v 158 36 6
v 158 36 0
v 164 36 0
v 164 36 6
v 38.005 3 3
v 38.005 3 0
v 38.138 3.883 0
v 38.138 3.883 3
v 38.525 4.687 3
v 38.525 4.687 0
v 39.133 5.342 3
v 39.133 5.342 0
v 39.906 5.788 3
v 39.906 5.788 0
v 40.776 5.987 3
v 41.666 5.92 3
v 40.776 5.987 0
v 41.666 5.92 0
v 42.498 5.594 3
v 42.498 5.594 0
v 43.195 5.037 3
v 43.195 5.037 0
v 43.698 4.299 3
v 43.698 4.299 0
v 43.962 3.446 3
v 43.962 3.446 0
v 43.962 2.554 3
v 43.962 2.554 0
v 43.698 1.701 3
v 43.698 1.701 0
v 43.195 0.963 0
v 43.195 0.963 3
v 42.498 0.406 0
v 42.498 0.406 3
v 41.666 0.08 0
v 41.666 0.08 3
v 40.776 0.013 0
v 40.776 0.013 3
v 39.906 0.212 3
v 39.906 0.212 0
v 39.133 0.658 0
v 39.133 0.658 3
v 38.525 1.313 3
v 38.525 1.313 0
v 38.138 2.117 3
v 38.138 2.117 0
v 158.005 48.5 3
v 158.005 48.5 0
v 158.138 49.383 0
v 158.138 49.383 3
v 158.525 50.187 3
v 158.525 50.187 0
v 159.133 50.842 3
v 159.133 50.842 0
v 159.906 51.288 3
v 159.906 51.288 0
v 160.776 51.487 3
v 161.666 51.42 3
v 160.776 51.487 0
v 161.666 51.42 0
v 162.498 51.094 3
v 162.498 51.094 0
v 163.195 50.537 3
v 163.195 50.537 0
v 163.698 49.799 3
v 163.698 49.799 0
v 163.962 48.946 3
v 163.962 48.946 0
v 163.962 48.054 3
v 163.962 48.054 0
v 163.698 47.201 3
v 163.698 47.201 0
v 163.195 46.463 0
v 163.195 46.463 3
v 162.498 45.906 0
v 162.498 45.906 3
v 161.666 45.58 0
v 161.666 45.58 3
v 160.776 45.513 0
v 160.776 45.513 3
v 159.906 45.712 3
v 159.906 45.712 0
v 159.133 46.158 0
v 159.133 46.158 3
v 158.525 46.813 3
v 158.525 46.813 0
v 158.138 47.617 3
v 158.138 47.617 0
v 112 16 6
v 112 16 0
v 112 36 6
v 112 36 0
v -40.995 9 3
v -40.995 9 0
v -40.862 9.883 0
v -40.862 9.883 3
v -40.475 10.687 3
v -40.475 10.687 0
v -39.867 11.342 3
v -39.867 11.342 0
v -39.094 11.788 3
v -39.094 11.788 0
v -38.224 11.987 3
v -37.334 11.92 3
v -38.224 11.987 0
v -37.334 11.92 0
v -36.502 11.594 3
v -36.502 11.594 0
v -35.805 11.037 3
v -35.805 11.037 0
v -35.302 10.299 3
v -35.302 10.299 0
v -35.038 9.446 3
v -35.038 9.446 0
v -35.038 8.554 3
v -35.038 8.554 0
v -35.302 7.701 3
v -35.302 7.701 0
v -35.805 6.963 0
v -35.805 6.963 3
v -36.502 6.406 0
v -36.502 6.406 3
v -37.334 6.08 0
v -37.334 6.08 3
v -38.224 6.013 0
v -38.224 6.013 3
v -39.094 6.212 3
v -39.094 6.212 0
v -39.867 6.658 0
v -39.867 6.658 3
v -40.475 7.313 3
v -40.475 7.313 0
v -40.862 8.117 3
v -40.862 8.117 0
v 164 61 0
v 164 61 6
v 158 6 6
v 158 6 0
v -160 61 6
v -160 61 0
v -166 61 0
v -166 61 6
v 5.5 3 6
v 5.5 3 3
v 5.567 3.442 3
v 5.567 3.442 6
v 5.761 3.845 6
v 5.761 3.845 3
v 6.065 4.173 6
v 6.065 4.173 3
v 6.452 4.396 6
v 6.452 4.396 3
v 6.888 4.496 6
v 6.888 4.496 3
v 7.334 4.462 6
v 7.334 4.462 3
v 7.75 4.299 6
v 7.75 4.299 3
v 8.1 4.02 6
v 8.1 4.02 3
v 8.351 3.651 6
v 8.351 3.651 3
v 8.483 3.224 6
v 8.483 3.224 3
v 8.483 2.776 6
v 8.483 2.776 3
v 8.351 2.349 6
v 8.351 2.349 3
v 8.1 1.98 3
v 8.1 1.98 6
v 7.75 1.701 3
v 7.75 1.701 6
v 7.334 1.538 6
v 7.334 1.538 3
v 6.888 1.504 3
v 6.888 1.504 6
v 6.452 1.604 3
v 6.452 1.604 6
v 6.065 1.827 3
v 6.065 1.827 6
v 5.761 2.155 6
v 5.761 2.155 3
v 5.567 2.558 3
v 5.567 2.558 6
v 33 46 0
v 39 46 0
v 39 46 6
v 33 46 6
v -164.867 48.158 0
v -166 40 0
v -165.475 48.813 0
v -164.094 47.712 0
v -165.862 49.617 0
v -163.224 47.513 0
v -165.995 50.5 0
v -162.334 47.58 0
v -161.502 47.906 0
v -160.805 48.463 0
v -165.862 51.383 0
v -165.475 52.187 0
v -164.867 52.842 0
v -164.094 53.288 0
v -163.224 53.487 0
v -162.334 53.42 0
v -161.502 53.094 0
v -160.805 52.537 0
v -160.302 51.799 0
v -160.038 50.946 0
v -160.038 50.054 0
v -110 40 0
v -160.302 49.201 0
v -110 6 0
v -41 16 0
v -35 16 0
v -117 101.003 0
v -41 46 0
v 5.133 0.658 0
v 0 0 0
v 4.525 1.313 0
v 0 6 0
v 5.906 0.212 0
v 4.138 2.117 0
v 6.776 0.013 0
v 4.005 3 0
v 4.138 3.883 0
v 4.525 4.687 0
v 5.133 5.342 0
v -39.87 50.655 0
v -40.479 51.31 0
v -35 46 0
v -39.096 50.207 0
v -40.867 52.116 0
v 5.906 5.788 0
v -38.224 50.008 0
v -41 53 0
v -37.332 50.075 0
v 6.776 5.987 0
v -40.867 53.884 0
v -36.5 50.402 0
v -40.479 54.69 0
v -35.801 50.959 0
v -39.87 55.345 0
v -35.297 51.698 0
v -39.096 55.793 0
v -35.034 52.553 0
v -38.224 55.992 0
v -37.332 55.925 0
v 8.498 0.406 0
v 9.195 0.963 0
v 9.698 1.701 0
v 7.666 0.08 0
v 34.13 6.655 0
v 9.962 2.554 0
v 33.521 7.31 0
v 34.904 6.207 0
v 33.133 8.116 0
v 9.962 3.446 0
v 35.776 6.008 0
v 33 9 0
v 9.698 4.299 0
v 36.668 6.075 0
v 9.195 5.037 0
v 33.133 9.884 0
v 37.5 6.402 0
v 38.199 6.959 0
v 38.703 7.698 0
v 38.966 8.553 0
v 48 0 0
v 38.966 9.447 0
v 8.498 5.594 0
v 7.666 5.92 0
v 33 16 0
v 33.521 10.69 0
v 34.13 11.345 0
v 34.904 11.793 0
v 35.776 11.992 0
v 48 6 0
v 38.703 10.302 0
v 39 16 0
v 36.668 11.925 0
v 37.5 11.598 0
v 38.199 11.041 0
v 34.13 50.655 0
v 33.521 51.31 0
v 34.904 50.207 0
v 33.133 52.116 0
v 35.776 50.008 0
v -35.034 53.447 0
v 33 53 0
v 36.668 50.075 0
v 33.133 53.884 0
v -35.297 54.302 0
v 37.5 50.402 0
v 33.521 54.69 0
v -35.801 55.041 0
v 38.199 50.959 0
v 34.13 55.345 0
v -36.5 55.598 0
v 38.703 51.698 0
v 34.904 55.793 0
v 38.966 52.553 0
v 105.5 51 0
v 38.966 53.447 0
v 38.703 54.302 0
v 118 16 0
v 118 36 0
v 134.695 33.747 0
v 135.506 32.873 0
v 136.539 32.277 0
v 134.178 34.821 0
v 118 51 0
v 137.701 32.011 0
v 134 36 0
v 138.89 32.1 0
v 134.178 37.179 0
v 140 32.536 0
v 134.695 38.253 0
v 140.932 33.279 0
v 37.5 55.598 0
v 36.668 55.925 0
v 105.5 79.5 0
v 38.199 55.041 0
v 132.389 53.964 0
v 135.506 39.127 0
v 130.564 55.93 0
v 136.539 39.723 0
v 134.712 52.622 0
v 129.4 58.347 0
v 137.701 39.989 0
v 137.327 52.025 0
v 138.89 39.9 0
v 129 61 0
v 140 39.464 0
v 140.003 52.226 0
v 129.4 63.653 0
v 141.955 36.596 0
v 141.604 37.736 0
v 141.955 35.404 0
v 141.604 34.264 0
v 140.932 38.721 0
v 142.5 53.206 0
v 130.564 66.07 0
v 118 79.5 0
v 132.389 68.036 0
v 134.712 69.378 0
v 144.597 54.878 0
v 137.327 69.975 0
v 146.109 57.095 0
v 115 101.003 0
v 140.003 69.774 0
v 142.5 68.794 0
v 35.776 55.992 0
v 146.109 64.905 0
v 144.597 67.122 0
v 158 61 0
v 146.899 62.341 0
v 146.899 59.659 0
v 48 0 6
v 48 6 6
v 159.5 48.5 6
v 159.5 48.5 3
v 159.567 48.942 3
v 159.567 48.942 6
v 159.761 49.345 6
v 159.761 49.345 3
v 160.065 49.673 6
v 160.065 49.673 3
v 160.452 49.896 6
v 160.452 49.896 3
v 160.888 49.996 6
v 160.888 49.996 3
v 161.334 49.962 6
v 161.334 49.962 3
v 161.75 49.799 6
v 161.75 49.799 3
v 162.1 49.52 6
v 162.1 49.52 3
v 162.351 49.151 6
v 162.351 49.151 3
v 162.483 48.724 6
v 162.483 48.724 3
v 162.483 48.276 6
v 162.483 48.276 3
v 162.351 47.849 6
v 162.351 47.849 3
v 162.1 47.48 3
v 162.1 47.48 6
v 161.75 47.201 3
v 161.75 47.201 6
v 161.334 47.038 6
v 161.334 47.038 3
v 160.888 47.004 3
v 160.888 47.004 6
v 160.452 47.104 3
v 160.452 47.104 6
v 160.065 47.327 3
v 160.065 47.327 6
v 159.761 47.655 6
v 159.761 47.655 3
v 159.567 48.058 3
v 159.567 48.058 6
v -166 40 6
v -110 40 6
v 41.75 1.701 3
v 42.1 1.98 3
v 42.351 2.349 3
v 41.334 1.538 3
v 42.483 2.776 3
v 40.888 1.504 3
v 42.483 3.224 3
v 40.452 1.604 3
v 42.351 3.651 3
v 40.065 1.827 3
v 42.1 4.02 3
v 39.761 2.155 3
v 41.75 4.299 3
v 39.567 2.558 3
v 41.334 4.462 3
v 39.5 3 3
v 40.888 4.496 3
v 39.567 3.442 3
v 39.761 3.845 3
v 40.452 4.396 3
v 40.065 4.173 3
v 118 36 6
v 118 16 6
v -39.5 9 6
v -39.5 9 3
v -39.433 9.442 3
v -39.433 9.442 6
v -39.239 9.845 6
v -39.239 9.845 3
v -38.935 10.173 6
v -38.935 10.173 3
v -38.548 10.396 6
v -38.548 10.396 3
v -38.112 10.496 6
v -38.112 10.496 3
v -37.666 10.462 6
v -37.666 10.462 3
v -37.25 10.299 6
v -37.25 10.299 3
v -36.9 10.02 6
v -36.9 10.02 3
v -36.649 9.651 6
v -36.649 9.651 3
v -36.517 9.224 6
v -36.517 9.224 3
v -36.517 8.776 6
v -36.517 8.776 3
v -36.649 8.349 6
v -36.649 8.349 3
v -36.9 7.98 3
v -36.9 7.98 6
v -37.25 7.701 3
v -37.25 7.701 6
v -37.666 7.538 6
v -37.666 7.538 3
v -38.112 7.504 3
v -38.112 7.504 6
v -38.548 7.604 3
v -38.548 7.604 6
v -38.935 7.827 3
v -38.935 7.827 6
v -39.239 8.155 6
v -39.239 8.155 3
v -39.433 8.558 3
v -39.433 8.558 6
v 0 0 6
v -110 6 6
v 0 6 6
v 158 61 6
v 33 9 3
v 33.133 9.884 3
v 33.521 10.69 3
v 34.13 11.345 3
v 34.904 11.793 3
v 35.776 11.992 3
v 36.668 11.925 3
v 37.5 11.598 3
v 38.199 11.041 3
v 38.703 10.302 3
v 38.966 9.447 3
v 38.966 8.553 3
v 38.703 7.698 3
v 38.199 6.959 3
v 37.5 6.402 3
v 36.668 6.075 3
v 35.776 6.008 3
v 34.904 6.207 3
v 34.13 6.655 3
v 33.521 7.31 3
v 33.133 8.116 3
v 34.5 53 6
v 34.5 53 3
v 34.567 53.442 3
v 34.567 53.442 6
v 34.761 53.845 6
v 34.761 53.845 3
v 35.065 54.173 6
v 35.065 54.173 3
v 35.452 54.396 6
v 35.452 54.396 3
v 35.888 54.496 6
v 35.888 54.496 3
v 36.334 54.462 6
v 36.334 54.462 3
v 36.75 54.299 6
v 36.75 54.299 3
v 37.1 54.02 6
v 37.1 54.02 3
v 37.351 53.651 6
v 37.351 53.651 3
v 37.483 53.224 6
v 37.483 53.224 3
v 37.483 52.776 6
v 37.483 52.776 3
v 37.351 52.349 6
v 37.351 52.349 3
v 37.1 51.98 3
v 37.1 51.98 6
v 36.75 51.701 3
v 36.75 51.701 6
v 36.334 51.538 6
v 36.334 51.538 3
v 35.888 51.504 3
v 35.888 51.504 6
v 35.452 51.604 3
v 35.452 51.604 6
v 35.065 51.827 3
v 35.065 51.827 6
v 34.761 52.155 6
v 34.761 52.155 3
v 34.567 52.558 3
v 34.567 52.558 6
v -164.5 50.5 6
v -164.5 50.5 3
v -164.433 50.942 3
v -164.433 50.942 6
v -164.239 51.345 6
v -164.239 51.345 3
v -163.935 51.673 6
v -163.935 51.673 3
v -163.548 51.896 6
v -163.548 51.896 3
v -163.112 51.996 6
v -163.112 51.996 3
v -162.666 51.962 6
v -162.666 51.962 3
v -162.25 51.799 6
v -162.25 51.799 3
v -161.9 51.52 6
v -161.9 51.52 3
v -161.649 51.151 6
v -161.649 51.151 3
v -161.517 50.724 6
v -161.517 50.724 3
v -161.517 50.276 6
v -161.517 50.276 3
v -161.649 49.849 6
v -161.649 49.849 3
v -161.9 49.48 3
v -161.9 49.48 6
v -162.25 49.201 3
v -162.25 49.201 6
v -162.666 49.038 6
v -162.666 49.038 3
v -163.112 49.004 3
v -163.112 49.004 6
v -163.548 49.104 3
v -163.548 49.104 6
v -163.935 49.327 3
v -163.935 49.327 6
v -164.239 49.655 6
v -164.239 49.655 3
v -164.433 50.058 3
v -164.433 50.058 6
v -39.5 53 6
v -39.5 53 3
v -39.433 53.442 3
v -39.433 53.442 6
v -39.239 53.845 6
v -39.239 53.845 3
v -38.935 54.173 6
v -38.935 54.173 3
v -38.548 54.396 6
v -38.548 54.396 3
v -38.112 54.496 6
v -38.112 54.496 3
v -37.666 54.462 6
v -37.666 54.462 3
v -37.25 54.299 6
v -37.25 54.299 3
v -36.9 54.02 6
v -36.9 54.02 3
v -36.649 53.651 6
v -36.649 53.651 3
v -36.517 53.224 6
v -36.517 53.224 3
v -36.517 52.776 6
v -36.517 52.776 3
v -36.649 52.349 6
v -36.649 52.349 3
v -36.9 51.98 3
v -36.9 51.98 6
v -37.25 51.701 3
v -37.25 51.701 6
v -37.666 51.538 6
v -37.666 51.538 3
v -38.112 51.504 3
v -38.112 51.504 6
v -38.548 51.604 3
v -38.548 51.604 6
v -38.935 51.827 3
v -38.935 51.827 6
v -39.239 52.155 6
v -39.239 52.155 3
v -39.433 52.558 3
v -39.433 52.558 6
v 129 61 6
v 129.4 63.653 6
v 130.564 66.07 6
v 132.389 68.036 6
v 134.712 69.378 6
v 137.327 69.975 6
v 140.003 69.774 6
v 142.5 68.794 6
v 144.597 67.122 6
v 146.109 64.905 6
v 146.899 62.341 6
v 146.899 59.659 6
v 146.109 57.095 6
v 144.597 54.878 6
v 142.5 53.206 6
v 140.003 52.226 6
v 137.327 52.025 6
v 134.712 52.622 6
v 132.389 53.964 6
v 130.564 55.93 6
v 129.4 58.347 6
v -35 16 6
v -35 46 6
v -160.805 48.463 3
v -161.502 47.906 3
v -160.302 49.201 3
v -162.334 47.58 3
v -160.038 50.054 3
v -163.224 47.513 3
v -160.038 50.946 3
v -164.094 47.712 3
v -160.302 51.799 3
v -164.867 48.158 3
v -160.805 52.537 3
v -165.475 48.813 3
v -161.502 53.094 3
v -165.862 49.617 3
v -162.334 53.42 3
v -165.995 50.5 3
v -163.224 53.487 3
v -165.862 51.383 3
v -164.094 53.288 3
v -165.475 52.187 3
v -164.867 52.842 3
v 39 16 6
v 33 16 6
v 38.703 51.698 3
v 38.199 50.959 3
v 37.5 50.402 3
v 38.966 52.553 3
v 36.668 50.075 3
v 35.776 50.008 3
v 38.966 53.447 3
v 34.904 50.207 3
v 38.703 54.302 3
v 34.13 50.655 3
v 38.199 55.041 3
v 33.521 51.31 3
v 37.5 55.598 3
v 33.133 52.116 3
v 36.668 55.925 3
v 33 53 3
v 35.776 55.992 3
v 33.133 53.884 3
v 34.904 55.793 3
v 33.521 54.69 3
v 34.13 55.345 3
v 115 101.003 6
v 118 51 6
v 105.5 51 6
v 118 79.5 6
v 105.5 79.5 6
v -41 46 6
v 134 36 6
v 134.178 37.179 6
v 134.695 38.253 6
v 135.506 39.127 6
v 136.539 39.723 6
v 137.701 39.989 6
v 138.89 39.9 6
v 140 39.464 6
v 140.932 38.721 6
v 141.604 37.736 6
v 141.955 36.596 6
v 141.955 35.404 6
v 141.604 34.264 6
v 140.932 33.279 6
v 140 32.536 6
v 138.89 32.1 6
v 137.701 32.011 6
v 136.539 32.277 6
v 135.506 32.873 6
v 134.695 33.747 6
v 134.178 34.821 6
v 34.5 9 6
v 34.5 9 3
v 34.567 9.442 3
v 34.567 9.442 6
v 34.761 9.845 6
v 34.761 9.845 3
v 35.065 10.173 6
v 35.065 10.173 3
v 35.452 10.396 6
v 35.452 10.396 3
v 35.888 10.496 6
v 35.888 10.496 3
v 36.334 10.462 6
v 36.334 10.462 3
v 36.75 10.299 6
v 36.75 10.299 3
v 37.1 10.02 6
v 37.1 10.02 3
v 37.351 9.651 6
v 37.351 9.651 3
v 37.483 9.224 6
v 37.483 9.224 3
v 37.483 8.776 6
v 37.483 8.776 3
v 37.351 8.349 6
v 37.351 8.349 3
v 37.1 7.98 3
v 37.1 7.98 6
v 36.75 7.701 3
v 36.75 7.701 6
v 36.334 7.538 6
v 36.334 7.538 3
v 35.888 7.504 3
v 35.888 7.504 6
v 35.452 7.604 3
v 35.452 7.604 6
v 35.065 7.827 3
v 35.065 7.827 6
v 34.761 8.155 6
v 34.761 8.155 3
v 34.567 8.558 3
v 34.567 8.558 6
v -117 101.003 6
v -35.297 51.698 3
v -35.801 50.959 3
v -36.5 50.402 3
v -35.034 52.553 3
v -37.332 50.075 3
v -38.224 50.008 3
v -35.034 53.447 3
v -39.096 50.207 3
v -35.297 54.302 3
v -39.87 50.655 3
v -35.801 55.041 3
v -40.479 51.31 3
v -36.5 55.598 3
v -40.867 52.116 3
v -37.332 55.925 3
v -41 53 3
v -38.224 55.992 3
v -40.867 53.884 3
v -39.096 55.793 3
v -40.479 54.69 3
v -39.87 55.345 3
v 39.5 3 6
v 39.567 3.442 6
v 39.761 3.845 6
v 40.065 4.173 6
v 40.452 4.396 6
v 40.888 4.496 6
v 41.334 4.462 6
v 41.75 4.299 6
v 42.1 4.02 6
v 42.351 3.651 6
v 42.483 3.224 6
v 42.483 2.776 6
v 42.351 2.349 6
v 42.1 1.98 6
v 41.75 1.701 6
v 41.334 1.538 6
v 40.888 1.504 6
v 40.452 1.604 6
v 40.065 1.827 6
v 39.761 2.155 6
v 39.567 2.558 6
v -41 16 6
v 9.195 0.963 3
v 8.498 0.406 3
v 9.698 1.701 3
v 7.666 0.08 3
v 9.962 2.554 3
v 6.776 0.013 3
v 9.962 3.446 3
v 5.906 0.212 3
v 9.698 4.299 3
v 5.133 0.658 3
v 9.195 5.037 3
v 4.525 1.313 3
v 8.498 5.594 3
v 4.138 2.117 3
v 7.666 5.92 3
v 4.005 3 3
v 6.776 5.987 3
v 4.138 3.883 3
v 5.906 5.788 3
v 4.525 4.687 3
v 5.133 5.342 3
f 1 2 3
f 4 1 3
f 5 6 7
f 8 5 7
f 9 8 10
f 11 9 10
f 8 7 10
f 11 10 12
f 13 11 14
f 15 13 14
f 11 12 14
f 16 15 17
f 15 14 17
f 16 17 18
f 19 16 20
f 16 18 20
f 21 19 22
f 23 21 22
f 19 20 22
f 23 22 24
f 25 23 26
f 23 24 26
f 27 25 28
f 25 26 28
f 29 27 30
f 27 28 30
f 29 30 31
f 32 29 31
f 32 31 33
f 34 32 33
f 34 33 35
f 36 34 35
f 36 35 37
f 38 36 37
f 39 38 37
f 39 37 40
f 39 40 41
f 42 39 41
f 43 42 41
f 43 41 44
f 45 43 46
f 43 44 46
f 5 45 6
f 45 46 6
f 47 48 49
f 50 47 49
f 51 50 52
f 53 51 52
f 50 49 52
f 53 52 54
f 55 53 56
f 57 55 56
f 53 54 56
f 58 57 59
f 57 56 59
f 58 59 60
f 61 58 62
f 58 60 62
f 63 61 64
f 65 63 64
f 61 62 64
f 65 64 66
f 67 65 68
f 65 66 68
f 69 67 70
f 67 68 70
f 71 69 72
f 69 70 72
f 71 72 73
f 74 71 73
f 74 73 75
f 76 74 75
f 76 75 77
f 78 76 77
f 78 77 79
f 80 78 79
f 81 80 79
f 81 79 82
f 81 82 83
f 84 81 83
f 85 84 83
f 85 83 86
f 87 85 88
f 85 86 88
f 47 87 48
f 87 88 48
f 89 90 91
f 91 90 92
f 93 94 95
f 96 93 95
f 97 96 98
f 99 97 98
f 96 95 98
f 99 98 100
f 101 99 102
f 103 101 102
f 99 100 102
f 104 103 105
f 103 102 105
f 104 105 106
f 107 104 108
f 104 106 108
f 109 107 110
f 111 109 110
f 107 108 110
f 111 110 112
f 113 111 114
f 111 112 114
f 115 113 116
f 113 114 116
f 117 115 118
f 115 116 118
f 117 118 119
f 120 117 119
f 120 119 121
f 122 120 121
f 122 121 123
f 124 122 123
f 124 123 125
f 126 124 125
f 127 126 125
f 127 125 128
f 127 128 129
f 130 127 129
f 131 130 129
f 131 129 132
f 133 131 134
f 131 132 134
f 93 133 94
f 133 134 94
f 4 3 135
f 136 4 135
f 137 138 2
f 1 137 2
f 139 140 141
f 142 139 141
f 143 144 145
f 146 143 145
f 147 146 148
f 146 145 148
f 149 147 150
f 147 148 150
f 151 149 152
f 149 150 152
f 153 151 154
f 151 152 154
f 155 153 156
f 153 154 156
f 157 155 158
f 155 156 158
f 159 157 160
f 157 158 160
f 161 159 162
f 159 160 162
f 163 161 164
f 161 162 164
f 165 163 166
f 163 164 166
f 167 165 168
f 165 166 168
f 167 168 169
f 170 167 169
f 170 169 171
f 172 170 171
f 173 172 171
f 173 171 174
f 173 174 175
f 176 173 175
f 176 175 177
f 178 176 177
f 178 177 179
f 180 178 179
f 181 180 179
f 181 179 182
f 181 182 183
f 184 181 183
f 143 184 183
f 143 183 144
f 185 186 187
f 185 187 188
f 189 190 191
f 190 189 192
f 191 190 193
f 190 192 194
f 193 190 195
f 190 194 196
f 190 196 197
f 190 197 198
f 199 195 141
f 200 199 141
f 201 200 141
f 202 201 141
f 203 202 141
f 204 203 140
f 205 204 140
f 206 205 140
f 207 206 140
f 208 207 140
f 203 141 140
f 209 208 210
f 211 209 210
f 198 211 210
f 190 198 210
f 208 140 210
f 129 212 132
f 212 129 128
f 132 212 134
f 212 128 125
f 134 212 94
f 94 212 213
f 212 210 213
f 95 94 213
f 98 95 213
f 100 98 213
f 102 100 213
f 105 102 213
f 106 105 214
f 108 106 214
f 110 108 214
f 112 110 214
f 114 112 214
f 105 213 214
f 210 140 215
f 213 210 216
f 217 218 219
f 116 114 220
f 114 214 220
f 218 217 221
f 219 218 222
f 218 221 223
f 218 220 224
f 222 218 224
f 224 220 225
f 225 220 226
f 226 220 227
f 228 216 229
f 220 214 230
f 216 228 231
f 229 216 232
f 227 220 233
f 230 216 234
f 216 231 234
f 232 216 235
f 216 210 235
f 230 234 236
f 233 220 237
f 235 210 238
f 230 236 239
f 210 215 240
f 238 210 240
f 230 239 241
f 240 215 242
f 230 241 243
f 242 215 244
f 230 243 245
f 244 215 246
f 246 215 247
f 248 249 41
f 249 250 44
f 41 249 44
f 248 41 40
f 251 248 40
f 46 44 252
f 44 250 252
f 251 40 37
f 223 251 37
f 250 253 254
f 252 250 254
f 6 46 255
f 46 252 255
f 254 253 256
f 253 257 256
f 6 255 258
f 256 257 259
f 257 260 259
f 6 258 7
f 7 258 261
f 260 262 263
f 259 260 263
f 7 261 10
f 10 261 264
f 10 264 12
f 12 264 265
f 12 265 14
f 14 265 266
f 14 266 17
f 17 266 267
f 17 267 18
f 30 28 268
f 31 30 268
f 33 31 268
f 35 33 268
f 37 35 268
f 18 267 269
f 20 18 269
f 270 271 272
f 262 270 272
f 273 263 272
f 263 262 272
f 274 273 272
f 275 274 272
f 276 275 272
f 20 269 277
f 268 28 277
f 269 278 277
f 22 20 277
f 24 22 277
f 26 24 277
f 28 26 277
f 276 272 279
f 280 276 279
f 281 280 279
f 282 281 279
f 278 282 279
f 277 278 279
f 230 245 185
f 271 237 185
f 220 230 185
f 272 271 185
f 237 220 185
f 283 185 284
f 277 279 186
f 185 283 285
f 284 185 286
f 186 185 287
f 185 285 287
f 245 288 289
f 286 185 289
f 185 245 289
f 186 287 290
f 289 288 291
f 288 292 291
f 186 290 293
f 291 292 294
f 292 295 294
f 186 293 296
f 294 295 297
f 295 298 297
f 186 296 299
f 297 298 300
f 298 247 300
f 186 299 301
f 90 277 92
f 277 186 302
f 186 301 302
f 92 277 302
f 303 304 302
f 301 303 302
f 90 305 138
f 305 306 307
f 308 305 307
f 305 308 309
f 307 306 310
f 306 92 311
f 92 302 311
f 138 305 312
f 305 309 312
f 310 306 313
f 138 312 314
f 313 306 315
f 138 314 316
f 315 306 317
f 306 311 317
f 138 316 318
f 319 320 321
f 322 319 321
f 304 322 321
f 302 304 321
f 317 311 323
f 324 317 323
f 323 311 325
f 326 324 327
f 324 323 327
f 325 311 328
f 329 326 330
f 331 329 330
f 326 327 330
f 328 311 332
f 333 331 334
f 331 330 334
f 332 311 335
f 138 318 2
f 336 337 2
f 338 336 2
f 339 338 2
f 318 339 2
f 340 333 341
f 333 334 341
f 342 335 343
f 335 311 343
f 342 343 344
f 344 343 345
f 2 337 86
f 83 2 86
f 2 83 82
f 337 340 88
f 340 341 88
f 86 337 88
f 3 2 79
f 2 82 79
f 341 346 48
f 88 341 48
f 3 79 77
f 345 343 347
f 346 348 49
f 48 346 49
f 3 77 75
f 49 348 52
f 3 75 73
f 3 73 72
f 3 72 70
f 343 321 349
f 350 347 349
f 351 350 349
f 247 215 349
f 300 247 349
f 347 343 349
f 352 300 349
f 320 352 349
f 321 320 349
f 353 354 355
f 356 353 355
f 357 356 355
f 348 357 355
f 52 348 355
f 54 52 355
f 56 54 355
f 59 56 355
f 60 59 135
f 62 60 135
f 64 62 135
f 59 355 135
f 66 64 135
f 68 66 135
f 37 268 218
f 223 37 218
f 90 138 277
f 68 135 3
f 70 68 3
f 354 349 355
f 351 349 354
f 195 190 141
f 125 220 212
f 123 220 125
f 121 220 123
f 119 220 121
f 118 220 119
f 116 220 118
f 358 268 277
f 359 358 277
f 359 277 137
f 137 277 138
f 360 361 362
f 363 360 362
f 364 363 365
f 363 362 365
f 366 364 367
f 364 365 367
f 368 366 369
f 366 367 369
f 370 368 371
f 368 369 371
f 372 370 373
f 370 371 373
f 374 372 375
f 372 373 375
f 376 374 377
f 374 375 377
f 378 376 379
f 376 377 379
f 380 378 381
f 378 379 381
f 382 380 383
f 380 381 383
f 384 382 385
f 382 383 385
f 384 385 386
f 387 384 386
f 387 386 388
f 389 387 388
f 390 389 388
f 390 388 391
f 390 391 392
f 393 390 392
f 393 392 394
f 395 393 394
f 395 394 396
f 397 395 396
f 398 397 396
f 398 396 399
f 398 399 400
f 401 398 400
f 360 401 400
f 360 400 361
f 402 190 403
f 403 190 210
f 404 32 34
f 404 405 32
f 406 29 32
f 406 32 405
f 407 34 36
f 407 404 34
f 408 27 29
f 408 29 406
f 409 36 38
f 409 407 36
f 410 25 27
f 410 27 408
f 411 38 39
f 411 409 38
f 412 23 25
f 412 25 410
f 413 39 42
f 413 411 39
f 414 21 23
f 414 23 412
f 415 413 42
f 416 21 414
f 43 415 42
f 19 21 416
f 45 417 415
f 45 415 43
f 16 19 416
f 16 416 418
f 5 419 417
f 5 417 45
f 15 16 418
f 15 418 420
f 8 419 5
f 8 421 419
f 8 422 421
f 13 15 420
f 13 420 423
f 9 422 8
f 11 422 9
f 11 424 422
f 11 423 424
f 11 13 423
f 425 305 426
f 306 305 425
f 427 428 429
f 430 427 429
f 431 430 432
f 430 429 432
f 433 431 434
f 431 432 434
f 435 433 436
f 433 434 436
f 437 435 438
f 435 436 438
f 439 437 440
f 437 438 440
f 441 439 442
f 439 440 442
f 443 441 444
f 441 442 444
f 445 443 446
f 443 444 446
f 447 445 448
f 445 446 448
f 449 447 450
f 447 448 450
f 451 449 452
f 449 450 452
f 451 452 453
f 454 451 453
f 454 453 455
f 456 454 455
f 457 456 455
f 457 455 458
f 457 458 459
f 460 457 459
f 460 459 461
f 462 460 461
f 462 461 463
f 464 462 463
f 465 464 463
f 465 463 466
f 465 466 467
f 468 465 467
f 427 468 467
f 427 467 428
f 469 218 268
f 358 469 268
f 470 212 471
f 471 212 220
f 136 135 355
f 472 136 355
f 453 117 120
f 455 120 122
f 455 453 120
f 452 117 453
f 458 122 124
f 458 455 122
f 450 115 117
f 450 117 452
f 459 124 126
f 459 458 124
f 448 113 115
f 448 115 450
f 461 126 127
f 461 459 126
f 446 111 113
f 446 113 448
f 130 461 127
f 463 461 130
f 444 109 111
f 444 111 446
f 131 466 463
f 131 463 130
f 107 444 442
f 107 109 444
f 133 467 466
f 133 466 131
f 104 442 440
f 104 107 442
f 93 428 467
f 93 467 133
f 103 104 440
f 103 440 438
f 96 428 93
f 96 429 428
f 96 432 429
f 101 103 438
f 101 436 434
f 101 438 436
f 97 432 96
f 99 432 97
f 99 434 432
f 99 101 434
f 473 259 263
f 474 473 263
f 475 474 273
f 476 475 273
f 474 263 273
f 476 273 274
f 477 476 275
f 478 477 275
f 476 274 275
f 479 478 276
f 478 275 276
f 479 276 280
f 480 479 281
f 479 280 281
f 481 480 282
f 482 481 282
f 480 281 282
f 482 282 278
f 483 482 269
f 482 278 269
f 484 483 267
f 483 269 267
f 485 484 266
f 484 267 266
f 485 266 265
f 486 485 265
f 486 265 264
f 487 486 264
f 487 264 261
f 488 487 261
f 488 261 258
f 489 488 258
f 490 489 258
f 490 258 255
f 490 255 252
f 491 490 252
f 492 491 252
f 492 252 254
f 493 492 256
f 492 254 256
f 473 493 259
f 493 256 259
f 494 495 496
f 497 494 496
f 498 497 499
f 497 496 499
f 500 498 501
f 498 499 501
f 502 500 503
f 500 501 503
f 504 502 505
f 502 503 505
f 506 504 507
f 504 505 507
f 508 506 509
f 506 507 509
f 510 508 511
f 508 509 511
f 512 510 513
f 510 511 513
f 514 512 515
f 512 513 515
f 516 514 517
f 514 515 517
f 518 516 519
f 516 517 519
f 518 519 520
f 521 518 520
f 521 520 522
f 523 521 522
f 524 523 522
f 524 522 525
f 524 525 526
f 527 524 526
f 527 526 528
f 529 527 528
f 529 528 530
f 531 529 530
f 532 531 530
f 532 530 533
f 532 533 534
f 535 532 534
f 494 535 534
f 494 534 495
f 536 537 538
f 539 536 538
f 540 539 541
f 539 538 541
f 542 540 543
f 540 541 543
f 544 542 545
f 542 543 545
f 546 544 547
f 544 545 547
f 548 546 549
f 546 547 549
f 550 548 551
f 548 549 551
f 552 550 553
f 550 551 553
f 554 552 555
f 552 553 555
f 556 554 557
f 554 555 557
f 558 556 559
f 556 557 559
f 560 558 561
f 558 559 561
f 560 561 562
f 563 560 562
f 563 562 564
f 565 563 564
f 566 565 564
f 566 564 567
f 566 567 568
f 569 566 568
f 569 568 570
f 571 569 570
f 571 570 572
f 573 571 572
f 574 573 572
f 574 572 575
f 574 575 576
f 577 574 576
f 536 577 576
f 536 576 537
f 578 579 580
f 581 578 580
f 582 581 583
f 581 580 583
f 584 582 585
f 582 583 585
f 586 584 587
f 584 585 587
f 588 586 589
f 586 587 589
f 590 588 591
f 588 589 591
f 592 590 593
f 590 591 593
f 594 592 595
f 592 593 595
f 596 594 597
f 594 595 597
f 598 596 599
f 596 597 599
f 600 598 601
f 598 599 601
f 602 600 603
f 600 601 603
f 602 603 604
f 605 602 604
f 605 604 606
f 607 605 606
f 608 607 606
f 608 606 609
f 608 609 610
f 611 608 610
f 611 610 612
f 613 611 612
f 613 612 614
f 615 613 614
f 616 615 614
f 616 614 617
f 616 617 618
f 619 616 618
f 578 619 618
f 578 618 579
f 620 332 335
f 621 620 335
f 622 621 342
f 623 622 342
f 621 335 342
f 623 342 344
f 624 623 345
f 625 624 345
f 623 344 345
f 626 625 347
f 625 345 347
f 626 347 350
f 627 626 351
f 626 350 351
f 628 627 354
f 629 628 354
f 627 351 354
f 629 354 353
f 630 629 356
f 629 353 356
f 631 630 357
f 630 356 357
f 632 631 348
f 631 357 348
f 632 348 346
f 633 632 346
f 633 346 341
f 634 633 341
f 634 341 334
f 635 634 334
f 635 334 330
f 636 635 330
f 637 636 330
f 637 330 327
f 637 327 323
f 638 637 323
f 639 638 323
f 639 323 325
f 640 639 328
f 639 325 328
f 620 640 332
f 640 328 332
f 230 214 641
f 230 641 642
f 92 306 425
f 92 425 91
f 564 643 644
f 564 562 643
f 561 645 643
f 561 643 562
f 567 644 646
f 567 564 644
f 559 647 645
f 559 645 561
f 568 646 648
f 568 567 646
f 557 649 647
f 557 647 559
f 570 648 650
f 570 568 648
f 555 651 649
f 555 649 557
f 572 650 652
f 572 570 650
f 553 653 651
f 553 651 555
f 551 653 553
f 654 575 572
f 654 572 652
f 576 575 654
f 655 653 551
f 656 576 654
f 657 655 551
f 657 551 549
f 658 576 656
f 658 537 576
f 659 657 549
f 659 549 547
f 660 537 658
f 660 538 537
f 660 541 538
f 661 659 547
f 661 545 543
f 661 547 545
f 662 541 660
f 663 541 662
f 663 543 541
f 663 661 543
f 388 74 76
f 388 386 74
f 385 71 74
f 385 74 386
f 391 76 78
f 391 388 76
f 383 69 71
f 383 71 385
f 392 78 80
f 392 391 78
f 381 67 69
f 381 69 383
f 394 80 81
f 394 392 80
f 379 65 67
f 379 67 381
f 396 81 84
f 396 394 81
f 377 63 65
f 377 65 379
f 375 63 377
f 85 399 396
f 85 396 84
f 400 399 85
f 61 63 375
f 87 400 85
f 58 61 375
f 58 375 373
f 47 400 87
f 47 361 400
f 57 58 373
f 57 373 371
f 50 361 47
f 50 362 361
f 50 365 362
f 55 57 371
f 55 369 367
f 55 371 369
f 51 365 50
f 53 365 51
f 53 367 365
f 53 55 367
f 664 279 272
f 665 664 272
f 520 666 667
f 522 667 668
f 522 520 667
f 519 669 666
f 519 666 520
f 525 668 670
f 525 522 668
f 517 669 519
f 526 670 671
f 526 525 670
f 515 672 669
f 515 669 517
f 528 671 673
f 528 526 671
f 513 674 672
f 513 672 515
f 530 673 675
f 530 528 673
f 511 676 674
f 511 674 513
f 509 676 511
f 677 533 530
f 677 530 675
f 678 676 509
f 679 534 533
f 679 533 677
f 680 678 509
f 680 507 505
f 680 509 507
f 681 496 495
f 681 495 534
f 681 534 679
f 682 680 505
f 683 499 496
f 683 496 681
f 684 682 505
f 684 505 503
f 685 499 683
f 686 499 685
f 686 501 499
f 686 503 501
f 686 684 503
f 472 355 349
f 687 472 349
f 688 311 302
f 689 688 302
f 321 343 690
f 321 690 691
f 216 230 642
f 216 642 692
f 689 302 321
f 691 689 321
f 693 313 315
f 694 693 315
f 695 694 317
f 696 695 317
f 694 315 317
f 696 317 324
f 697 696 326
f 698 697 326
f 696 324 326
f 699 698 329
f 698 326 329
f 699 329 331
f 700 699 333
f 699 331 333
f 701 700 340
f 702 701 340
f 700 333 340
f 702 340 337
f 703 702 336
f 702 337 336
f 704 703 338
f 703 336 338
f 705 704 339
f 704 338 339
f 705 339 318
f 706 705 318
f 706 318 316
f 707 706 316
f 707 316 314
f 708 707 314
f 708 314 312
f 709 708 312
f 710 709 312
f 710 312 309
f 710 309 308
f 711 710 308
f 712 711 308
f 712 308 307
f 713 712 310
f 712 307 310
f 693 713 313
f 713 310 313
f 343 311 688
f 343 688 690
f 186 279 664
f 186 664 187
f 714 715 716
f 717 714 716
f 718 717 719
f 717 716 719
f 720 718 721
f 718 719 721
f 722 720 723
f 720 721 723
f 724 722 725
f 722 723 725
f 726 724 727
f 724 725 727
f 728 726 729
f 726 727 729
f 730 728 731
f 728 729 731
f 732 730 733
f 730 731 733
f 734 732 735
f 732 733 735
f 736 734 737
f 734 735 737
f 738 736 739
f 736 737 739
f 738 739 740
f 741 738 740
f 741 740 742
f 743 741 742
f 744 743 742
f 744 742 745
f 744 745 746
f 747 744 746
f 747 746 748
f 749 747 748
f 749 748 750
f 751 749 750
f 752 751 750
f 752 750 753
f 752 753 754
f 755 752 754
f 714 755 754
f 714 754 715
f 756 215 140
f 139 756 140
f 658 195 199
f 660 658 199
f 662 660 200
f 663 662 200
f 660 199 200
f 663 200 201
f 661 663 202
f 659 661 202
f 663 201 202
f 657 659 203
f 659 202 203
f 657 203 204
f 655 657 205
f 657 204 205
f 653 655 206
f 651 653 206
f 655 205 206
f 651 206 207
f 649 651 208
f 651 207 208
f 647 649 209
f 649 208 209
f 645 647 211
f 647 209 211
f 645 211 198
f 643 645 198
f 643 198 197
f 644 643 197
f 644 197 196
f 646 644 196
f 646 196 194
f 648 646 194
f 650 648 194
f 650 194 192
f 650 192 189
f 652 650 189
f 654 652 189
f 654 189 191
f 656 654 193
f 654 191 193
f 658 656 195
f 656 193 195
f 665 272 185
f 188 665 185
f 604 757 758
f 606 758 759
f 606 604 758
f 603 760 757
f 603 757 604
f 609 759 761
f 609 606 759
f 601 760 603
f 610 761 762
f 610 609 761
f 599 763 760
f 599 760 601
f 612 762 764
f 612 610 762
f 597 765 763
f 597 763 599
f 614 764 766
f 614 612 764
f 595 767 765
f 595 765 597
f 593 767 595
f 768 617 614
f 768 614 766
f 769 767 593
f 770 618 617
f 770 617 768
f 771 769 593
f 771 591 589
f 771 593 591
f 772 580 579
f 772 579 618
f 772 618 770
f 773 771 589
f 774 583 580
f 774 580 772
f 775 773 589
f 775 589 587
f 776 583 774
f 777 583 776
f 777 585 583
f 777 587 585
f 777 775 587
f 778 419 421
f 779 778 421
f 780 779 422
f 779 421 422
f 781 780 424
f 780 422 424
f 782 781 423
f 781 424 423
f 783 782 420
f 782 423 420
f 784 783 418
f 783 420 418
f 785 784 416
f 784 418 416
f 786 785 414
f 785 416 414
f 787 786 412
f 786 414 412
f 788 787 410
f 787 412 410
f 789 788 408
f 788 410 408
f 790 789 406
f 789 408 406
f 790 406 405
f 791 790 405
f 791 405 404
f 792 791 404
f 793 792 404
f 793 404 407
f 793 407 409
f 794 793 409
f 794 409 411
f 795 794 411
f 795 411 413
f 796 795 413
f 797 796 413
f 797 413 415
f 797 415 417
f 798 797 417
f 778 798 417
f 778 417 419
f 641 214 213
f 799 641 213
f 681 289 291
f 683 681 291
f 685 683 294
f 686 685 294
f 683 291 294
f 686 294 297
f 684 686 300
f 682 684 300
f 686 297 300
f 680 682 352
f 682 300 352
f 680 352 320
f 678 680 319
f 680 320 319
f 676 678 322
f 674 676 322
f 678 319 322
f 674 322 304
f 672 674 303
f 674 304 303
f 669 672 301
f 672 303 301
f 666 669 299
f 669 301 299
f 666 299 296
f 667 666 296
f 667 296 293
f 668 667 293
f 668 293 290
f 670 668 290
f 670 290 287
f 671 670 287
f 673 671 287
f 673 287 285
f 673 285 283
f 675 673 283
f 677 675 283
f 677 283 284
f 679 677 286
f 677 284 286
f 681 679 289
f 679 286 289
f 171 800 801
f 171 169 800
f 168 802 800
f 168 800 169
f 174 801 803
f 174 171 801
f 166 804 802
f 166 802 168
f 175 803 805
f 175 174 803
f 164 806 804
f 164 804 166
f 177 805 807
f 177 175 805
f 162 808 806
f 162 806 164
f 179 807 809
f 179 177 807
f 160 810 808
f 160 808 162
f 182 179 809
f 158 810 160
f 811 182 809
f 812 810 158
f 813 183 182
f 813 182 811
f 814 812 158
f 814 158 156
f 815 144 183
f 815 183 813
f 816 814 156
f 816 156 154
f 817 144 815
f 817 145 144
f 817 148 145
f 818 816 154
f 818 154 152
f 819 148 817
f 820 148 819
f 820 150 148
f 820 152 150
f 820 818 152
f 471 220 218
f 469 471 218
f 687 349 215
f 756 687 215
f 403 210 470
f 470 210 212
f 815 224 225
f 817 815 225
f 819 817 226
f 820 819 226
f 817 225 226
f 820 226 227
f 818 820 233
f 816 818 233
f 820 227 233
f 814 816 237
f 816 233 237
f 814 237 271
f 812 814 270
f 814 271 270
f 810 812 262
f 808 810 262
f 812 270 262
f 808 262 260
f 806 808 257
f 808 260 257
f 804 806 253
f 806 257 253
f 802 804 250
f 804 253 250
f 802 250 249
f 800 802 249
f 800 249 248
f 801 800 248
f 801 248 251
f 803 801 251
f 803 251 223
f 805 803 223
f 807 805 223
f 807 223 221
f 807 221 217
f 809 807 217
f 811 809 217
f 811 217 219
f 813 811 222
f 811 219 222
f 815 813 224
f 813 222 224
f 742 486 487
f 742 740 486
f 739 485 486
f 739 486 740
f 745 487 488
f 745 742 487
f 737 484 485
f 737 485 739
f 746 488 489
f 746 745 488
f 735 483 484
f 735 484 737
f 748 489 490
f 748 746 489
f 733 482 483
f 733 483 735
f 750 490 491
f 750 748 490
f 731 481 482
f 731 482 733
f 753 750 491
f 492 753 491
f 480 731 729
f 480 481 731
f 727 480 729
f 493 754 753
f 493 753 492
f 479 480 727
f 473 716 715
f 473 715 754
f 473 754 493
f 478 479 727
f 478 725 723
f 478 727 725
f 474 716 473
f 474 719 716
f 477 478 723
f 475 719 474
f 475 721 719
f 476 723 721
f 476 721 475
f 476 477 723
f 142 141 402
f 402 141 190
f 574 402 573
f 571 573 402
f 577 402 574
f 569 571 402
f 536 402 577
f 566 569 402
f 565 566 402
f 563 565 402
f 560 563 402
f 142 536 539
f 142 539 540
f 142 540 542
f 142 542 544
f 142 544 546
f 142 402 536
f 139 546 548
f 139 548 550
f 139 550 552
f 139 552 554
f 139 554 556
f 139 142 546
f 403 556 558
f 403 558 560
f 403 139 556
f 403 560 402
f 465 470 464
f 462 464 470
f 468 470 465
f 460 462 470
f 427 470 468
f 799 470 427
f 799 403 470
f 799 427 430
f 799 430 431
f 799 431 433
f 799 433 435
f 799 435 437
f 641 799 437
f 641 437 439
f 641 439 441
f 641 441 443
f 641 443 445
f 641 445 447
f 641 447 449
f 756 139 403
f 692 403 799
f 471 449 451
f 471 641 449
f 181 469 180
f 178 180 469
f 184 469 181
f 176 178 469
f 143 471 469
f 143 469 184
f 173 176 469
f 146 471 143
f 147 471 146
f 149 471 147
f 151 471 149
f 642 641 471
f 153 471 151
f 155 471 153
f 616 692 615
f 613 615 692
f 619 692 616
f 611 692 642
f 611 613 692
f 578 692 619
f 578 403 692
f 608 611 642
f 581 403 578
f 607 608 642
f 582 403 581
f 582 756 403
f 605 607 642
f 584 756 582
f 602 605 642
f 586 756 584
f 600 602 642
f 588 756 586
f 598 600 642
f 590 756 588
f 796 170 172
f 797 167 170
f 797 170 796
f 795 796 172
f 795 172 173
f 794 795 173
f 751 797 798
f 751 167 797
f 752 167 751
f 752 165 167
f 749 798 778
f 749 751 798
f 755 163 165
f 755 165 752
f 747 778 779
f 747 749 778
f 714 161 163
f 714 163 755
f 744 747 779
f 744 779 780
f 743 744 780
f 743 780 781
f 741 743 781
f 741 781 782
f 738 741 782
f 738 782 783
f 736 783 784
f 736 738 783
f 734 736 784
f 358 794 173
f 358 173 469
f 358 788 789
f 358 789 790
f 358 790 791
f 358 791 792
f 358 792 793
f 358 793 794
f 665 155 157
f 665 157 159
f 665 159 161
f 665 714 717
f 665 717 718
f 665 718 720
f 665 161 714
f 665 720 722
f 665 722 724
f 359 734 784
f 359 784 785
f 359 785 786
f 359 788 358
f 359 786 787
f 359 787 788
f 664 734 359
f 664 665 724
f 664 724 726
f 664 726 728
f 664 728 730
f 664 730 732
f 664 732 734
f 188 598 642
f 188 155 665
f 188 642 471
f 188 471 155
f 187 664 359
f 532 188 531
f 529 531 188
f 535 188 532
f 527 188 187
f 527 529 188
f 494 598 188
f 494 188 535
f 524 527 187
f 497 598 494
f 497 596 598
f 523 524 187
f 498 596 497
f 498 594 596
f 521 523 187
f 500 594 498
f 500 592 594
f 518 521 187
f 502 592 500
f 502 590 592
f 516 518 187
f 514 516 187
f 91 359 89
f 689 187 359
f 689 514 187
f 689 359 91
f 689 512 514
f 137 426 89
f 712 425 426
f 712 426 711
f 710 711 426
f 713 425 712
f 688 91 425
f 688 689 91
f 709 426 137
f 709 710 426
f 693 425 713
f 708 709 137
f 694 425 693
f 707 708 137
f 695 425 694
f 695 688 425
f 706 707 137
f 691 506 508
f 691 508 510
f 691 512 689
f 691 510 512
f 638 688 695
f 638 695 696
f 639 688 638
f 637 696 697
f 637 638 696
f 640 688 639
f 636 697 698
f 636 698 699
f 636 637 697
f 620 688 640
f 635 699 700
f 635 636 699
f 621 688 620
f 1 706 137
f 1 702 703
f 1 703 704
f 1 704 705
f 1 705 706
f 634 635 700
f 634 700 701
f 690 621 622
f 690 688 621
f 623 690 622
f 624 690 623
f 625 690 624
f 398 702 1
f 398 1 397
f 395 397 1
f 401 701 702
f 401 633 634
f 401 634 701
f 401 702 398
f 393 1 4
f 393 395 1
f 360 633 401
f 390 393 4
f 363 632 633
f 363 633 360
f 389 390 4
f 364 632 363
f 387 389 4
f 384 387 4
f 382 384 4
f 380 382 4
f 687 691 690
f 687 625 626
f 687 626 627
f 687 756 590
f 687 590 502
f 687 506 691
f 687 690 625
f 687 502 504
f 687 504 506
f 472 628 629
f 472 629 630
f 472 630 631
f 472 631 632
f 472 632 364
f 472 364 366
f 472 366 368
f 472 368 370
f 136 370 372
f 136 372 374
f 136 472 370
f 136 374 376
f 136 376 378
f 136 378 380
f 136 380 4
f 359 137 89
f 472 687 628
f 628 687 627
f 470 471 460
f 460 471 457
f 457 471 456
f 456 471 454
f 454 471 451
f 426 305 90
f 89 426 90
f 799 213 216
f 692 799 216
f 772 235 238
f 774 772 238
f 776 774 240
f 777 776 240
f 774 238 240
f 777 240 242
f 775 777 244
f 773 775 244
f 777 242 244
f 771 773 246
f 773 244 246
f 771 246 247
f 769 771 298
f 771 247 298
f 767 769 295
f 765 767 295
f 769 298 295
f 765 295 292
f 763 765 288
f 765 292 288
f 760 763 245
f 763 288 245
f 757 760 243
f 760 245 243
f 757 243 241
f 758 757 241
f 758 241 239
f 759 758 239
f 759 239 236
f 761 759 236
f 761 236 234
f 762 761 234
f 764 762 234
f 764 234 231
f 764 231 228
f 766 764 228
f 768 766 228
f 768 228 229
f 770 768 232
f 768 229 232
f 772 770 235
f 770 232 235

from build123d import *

# Parameters (mm, degrees)
BOSS_EXTRU_1_DEPTH      = 6
ESQUISSE2_R             = 4
ESQUISSE2_R_2           = 9
ESQUISSE2_W             = 6
ESQUISSE2_H             = 30
ESQUISSE2_H_2           = 20
ESQUISSE2_W_2           = 12.5
ESQUISSE2_H_3           = 28.5
ENL_V_MAT_EXTRU_1_DEPTH = 6
ESQUISSE3_R             = 1.5
ENL_V_MAT_EXTRU_2_DEPTH = 6
ESQUISSE4_R             = 2.995
ESQUISSE4_R_2           = 3
ENL_V_MAT_EXTRU_3_DEPTH = 3


with BuildPart() as part:
    # Esquisse1 → Boss.-Extru.1 (new body)
    with BuildSketch(Plane.XY):
        Polygon((0, 0), (48, 0), (48, 6), (158, 6), (158, 36), (164, 36), (164, 61), (158, 61), (115, 101.002661161), (-117, 101.002661161), (-160, 61), (-166, 61), (-166, 40), (-110, 40), (-110, 6), (0, 6), align=None)
    extrude(amount=BOSS_EXTRU_1_DEPTH)

    # Esquisse2 → Enlèv. mat.-Extru.1 (cut)
    with BuildSketch(Plane(origin=(0, 0, 0), x_dir=(-1, 0, 0), z_dir=(0, 0, -1))):
        with Locations((-138, 36)):
            Circle(ESQUISSE2_R)
        with Locations((-138, 61)):
            Circle(ESQUISSE2_R_2)
        with Locations((38, 31)):
            Rectangle(ESQUISSE2_W, ESQUISSE2_H)
        with Locations((-36, 31)):
            Rectangle(ESQUISSE2_W, ESQUISSE2_H)
        with Locations((-115, 26)):
            Rectangle(ESQUISSE2_W, ESQUISSE2_H_2)
        with Locations((-111.75, 65.25)):
            Rectangle(ESQUISSE2_W_2, ESQUISSE2_H_3)
    extrude(amount=-ENL_V_MAT_EXTRU_1_DEPTH, mode=Mode.SUBTRACT)

    # Esquisse3 → Enlèv. mat.-Extru.2 (cut)
    with BuildSketch(Plane(origin=(0, 0, 0), x_dir=(-1, 0, 0), z_dir=(0, 0, -1))):
        with Locations((-161, 48.5)):
            Circle(ESQUISSE3_R)
        with Locations((-41, 3)):
            Circle(ESQUISSE3_R)
        with Locations((-7, 3)):
            Circle(ESQUISSE3_R)
        with Locations((-36, 9)):
            Circle(ESQUISSE3_R)
        with Locations((-36, 53)):
            Circle(ESQUISSE3_R)
        with Locations((38, 9)):
            Circle(ESQUISSE3_R)
        with Locations((38, 53)):
            Circle(ESQUISSE3_R)
        with Locations((163, 50.5)):
            Circle(ESQUISSE3_R)
    extrude(amount=-ENL_V_MAT_EXTRU_2_DEPTH, mode=Mode.SUBTRACT)

    # Esquisse4 → Enlèv. mat.-Extru.3 (cut)
    with BuildSketch(Plane(origin=(0, 0, 0), x_dir=(-1, 0, 0), z_dir=(0, 0, -1))):
        with Locations((38, 9)):
            Circle(ESQUISSE4_R)
        with Locations((38, 53)):
            Circle(ESQUISSE4_R_2)
        with Locations((-36, 53)):
            Circle(ESQUISSE4_R_2)
        with Locations((-36, 9)):
            Circle(ESQUISSE4_R_2)
        with Locations((-7, 3)):
            Circle(ESQUISSE4_R)
        with Locations((-41, 3)):
            Circle(ESQUISSE4_R)
        with Locations((-161, 48.5)):
            Circle(ESQUISSE4_R)
        with Locations((163, 50.5)):
            Circle(ESQUISSE4_R)
    extrude(amount=-ENL_V_MAT_EXTRU_3_DEPTH, mode=Mode.SUBTRACT)


solid = part.part
